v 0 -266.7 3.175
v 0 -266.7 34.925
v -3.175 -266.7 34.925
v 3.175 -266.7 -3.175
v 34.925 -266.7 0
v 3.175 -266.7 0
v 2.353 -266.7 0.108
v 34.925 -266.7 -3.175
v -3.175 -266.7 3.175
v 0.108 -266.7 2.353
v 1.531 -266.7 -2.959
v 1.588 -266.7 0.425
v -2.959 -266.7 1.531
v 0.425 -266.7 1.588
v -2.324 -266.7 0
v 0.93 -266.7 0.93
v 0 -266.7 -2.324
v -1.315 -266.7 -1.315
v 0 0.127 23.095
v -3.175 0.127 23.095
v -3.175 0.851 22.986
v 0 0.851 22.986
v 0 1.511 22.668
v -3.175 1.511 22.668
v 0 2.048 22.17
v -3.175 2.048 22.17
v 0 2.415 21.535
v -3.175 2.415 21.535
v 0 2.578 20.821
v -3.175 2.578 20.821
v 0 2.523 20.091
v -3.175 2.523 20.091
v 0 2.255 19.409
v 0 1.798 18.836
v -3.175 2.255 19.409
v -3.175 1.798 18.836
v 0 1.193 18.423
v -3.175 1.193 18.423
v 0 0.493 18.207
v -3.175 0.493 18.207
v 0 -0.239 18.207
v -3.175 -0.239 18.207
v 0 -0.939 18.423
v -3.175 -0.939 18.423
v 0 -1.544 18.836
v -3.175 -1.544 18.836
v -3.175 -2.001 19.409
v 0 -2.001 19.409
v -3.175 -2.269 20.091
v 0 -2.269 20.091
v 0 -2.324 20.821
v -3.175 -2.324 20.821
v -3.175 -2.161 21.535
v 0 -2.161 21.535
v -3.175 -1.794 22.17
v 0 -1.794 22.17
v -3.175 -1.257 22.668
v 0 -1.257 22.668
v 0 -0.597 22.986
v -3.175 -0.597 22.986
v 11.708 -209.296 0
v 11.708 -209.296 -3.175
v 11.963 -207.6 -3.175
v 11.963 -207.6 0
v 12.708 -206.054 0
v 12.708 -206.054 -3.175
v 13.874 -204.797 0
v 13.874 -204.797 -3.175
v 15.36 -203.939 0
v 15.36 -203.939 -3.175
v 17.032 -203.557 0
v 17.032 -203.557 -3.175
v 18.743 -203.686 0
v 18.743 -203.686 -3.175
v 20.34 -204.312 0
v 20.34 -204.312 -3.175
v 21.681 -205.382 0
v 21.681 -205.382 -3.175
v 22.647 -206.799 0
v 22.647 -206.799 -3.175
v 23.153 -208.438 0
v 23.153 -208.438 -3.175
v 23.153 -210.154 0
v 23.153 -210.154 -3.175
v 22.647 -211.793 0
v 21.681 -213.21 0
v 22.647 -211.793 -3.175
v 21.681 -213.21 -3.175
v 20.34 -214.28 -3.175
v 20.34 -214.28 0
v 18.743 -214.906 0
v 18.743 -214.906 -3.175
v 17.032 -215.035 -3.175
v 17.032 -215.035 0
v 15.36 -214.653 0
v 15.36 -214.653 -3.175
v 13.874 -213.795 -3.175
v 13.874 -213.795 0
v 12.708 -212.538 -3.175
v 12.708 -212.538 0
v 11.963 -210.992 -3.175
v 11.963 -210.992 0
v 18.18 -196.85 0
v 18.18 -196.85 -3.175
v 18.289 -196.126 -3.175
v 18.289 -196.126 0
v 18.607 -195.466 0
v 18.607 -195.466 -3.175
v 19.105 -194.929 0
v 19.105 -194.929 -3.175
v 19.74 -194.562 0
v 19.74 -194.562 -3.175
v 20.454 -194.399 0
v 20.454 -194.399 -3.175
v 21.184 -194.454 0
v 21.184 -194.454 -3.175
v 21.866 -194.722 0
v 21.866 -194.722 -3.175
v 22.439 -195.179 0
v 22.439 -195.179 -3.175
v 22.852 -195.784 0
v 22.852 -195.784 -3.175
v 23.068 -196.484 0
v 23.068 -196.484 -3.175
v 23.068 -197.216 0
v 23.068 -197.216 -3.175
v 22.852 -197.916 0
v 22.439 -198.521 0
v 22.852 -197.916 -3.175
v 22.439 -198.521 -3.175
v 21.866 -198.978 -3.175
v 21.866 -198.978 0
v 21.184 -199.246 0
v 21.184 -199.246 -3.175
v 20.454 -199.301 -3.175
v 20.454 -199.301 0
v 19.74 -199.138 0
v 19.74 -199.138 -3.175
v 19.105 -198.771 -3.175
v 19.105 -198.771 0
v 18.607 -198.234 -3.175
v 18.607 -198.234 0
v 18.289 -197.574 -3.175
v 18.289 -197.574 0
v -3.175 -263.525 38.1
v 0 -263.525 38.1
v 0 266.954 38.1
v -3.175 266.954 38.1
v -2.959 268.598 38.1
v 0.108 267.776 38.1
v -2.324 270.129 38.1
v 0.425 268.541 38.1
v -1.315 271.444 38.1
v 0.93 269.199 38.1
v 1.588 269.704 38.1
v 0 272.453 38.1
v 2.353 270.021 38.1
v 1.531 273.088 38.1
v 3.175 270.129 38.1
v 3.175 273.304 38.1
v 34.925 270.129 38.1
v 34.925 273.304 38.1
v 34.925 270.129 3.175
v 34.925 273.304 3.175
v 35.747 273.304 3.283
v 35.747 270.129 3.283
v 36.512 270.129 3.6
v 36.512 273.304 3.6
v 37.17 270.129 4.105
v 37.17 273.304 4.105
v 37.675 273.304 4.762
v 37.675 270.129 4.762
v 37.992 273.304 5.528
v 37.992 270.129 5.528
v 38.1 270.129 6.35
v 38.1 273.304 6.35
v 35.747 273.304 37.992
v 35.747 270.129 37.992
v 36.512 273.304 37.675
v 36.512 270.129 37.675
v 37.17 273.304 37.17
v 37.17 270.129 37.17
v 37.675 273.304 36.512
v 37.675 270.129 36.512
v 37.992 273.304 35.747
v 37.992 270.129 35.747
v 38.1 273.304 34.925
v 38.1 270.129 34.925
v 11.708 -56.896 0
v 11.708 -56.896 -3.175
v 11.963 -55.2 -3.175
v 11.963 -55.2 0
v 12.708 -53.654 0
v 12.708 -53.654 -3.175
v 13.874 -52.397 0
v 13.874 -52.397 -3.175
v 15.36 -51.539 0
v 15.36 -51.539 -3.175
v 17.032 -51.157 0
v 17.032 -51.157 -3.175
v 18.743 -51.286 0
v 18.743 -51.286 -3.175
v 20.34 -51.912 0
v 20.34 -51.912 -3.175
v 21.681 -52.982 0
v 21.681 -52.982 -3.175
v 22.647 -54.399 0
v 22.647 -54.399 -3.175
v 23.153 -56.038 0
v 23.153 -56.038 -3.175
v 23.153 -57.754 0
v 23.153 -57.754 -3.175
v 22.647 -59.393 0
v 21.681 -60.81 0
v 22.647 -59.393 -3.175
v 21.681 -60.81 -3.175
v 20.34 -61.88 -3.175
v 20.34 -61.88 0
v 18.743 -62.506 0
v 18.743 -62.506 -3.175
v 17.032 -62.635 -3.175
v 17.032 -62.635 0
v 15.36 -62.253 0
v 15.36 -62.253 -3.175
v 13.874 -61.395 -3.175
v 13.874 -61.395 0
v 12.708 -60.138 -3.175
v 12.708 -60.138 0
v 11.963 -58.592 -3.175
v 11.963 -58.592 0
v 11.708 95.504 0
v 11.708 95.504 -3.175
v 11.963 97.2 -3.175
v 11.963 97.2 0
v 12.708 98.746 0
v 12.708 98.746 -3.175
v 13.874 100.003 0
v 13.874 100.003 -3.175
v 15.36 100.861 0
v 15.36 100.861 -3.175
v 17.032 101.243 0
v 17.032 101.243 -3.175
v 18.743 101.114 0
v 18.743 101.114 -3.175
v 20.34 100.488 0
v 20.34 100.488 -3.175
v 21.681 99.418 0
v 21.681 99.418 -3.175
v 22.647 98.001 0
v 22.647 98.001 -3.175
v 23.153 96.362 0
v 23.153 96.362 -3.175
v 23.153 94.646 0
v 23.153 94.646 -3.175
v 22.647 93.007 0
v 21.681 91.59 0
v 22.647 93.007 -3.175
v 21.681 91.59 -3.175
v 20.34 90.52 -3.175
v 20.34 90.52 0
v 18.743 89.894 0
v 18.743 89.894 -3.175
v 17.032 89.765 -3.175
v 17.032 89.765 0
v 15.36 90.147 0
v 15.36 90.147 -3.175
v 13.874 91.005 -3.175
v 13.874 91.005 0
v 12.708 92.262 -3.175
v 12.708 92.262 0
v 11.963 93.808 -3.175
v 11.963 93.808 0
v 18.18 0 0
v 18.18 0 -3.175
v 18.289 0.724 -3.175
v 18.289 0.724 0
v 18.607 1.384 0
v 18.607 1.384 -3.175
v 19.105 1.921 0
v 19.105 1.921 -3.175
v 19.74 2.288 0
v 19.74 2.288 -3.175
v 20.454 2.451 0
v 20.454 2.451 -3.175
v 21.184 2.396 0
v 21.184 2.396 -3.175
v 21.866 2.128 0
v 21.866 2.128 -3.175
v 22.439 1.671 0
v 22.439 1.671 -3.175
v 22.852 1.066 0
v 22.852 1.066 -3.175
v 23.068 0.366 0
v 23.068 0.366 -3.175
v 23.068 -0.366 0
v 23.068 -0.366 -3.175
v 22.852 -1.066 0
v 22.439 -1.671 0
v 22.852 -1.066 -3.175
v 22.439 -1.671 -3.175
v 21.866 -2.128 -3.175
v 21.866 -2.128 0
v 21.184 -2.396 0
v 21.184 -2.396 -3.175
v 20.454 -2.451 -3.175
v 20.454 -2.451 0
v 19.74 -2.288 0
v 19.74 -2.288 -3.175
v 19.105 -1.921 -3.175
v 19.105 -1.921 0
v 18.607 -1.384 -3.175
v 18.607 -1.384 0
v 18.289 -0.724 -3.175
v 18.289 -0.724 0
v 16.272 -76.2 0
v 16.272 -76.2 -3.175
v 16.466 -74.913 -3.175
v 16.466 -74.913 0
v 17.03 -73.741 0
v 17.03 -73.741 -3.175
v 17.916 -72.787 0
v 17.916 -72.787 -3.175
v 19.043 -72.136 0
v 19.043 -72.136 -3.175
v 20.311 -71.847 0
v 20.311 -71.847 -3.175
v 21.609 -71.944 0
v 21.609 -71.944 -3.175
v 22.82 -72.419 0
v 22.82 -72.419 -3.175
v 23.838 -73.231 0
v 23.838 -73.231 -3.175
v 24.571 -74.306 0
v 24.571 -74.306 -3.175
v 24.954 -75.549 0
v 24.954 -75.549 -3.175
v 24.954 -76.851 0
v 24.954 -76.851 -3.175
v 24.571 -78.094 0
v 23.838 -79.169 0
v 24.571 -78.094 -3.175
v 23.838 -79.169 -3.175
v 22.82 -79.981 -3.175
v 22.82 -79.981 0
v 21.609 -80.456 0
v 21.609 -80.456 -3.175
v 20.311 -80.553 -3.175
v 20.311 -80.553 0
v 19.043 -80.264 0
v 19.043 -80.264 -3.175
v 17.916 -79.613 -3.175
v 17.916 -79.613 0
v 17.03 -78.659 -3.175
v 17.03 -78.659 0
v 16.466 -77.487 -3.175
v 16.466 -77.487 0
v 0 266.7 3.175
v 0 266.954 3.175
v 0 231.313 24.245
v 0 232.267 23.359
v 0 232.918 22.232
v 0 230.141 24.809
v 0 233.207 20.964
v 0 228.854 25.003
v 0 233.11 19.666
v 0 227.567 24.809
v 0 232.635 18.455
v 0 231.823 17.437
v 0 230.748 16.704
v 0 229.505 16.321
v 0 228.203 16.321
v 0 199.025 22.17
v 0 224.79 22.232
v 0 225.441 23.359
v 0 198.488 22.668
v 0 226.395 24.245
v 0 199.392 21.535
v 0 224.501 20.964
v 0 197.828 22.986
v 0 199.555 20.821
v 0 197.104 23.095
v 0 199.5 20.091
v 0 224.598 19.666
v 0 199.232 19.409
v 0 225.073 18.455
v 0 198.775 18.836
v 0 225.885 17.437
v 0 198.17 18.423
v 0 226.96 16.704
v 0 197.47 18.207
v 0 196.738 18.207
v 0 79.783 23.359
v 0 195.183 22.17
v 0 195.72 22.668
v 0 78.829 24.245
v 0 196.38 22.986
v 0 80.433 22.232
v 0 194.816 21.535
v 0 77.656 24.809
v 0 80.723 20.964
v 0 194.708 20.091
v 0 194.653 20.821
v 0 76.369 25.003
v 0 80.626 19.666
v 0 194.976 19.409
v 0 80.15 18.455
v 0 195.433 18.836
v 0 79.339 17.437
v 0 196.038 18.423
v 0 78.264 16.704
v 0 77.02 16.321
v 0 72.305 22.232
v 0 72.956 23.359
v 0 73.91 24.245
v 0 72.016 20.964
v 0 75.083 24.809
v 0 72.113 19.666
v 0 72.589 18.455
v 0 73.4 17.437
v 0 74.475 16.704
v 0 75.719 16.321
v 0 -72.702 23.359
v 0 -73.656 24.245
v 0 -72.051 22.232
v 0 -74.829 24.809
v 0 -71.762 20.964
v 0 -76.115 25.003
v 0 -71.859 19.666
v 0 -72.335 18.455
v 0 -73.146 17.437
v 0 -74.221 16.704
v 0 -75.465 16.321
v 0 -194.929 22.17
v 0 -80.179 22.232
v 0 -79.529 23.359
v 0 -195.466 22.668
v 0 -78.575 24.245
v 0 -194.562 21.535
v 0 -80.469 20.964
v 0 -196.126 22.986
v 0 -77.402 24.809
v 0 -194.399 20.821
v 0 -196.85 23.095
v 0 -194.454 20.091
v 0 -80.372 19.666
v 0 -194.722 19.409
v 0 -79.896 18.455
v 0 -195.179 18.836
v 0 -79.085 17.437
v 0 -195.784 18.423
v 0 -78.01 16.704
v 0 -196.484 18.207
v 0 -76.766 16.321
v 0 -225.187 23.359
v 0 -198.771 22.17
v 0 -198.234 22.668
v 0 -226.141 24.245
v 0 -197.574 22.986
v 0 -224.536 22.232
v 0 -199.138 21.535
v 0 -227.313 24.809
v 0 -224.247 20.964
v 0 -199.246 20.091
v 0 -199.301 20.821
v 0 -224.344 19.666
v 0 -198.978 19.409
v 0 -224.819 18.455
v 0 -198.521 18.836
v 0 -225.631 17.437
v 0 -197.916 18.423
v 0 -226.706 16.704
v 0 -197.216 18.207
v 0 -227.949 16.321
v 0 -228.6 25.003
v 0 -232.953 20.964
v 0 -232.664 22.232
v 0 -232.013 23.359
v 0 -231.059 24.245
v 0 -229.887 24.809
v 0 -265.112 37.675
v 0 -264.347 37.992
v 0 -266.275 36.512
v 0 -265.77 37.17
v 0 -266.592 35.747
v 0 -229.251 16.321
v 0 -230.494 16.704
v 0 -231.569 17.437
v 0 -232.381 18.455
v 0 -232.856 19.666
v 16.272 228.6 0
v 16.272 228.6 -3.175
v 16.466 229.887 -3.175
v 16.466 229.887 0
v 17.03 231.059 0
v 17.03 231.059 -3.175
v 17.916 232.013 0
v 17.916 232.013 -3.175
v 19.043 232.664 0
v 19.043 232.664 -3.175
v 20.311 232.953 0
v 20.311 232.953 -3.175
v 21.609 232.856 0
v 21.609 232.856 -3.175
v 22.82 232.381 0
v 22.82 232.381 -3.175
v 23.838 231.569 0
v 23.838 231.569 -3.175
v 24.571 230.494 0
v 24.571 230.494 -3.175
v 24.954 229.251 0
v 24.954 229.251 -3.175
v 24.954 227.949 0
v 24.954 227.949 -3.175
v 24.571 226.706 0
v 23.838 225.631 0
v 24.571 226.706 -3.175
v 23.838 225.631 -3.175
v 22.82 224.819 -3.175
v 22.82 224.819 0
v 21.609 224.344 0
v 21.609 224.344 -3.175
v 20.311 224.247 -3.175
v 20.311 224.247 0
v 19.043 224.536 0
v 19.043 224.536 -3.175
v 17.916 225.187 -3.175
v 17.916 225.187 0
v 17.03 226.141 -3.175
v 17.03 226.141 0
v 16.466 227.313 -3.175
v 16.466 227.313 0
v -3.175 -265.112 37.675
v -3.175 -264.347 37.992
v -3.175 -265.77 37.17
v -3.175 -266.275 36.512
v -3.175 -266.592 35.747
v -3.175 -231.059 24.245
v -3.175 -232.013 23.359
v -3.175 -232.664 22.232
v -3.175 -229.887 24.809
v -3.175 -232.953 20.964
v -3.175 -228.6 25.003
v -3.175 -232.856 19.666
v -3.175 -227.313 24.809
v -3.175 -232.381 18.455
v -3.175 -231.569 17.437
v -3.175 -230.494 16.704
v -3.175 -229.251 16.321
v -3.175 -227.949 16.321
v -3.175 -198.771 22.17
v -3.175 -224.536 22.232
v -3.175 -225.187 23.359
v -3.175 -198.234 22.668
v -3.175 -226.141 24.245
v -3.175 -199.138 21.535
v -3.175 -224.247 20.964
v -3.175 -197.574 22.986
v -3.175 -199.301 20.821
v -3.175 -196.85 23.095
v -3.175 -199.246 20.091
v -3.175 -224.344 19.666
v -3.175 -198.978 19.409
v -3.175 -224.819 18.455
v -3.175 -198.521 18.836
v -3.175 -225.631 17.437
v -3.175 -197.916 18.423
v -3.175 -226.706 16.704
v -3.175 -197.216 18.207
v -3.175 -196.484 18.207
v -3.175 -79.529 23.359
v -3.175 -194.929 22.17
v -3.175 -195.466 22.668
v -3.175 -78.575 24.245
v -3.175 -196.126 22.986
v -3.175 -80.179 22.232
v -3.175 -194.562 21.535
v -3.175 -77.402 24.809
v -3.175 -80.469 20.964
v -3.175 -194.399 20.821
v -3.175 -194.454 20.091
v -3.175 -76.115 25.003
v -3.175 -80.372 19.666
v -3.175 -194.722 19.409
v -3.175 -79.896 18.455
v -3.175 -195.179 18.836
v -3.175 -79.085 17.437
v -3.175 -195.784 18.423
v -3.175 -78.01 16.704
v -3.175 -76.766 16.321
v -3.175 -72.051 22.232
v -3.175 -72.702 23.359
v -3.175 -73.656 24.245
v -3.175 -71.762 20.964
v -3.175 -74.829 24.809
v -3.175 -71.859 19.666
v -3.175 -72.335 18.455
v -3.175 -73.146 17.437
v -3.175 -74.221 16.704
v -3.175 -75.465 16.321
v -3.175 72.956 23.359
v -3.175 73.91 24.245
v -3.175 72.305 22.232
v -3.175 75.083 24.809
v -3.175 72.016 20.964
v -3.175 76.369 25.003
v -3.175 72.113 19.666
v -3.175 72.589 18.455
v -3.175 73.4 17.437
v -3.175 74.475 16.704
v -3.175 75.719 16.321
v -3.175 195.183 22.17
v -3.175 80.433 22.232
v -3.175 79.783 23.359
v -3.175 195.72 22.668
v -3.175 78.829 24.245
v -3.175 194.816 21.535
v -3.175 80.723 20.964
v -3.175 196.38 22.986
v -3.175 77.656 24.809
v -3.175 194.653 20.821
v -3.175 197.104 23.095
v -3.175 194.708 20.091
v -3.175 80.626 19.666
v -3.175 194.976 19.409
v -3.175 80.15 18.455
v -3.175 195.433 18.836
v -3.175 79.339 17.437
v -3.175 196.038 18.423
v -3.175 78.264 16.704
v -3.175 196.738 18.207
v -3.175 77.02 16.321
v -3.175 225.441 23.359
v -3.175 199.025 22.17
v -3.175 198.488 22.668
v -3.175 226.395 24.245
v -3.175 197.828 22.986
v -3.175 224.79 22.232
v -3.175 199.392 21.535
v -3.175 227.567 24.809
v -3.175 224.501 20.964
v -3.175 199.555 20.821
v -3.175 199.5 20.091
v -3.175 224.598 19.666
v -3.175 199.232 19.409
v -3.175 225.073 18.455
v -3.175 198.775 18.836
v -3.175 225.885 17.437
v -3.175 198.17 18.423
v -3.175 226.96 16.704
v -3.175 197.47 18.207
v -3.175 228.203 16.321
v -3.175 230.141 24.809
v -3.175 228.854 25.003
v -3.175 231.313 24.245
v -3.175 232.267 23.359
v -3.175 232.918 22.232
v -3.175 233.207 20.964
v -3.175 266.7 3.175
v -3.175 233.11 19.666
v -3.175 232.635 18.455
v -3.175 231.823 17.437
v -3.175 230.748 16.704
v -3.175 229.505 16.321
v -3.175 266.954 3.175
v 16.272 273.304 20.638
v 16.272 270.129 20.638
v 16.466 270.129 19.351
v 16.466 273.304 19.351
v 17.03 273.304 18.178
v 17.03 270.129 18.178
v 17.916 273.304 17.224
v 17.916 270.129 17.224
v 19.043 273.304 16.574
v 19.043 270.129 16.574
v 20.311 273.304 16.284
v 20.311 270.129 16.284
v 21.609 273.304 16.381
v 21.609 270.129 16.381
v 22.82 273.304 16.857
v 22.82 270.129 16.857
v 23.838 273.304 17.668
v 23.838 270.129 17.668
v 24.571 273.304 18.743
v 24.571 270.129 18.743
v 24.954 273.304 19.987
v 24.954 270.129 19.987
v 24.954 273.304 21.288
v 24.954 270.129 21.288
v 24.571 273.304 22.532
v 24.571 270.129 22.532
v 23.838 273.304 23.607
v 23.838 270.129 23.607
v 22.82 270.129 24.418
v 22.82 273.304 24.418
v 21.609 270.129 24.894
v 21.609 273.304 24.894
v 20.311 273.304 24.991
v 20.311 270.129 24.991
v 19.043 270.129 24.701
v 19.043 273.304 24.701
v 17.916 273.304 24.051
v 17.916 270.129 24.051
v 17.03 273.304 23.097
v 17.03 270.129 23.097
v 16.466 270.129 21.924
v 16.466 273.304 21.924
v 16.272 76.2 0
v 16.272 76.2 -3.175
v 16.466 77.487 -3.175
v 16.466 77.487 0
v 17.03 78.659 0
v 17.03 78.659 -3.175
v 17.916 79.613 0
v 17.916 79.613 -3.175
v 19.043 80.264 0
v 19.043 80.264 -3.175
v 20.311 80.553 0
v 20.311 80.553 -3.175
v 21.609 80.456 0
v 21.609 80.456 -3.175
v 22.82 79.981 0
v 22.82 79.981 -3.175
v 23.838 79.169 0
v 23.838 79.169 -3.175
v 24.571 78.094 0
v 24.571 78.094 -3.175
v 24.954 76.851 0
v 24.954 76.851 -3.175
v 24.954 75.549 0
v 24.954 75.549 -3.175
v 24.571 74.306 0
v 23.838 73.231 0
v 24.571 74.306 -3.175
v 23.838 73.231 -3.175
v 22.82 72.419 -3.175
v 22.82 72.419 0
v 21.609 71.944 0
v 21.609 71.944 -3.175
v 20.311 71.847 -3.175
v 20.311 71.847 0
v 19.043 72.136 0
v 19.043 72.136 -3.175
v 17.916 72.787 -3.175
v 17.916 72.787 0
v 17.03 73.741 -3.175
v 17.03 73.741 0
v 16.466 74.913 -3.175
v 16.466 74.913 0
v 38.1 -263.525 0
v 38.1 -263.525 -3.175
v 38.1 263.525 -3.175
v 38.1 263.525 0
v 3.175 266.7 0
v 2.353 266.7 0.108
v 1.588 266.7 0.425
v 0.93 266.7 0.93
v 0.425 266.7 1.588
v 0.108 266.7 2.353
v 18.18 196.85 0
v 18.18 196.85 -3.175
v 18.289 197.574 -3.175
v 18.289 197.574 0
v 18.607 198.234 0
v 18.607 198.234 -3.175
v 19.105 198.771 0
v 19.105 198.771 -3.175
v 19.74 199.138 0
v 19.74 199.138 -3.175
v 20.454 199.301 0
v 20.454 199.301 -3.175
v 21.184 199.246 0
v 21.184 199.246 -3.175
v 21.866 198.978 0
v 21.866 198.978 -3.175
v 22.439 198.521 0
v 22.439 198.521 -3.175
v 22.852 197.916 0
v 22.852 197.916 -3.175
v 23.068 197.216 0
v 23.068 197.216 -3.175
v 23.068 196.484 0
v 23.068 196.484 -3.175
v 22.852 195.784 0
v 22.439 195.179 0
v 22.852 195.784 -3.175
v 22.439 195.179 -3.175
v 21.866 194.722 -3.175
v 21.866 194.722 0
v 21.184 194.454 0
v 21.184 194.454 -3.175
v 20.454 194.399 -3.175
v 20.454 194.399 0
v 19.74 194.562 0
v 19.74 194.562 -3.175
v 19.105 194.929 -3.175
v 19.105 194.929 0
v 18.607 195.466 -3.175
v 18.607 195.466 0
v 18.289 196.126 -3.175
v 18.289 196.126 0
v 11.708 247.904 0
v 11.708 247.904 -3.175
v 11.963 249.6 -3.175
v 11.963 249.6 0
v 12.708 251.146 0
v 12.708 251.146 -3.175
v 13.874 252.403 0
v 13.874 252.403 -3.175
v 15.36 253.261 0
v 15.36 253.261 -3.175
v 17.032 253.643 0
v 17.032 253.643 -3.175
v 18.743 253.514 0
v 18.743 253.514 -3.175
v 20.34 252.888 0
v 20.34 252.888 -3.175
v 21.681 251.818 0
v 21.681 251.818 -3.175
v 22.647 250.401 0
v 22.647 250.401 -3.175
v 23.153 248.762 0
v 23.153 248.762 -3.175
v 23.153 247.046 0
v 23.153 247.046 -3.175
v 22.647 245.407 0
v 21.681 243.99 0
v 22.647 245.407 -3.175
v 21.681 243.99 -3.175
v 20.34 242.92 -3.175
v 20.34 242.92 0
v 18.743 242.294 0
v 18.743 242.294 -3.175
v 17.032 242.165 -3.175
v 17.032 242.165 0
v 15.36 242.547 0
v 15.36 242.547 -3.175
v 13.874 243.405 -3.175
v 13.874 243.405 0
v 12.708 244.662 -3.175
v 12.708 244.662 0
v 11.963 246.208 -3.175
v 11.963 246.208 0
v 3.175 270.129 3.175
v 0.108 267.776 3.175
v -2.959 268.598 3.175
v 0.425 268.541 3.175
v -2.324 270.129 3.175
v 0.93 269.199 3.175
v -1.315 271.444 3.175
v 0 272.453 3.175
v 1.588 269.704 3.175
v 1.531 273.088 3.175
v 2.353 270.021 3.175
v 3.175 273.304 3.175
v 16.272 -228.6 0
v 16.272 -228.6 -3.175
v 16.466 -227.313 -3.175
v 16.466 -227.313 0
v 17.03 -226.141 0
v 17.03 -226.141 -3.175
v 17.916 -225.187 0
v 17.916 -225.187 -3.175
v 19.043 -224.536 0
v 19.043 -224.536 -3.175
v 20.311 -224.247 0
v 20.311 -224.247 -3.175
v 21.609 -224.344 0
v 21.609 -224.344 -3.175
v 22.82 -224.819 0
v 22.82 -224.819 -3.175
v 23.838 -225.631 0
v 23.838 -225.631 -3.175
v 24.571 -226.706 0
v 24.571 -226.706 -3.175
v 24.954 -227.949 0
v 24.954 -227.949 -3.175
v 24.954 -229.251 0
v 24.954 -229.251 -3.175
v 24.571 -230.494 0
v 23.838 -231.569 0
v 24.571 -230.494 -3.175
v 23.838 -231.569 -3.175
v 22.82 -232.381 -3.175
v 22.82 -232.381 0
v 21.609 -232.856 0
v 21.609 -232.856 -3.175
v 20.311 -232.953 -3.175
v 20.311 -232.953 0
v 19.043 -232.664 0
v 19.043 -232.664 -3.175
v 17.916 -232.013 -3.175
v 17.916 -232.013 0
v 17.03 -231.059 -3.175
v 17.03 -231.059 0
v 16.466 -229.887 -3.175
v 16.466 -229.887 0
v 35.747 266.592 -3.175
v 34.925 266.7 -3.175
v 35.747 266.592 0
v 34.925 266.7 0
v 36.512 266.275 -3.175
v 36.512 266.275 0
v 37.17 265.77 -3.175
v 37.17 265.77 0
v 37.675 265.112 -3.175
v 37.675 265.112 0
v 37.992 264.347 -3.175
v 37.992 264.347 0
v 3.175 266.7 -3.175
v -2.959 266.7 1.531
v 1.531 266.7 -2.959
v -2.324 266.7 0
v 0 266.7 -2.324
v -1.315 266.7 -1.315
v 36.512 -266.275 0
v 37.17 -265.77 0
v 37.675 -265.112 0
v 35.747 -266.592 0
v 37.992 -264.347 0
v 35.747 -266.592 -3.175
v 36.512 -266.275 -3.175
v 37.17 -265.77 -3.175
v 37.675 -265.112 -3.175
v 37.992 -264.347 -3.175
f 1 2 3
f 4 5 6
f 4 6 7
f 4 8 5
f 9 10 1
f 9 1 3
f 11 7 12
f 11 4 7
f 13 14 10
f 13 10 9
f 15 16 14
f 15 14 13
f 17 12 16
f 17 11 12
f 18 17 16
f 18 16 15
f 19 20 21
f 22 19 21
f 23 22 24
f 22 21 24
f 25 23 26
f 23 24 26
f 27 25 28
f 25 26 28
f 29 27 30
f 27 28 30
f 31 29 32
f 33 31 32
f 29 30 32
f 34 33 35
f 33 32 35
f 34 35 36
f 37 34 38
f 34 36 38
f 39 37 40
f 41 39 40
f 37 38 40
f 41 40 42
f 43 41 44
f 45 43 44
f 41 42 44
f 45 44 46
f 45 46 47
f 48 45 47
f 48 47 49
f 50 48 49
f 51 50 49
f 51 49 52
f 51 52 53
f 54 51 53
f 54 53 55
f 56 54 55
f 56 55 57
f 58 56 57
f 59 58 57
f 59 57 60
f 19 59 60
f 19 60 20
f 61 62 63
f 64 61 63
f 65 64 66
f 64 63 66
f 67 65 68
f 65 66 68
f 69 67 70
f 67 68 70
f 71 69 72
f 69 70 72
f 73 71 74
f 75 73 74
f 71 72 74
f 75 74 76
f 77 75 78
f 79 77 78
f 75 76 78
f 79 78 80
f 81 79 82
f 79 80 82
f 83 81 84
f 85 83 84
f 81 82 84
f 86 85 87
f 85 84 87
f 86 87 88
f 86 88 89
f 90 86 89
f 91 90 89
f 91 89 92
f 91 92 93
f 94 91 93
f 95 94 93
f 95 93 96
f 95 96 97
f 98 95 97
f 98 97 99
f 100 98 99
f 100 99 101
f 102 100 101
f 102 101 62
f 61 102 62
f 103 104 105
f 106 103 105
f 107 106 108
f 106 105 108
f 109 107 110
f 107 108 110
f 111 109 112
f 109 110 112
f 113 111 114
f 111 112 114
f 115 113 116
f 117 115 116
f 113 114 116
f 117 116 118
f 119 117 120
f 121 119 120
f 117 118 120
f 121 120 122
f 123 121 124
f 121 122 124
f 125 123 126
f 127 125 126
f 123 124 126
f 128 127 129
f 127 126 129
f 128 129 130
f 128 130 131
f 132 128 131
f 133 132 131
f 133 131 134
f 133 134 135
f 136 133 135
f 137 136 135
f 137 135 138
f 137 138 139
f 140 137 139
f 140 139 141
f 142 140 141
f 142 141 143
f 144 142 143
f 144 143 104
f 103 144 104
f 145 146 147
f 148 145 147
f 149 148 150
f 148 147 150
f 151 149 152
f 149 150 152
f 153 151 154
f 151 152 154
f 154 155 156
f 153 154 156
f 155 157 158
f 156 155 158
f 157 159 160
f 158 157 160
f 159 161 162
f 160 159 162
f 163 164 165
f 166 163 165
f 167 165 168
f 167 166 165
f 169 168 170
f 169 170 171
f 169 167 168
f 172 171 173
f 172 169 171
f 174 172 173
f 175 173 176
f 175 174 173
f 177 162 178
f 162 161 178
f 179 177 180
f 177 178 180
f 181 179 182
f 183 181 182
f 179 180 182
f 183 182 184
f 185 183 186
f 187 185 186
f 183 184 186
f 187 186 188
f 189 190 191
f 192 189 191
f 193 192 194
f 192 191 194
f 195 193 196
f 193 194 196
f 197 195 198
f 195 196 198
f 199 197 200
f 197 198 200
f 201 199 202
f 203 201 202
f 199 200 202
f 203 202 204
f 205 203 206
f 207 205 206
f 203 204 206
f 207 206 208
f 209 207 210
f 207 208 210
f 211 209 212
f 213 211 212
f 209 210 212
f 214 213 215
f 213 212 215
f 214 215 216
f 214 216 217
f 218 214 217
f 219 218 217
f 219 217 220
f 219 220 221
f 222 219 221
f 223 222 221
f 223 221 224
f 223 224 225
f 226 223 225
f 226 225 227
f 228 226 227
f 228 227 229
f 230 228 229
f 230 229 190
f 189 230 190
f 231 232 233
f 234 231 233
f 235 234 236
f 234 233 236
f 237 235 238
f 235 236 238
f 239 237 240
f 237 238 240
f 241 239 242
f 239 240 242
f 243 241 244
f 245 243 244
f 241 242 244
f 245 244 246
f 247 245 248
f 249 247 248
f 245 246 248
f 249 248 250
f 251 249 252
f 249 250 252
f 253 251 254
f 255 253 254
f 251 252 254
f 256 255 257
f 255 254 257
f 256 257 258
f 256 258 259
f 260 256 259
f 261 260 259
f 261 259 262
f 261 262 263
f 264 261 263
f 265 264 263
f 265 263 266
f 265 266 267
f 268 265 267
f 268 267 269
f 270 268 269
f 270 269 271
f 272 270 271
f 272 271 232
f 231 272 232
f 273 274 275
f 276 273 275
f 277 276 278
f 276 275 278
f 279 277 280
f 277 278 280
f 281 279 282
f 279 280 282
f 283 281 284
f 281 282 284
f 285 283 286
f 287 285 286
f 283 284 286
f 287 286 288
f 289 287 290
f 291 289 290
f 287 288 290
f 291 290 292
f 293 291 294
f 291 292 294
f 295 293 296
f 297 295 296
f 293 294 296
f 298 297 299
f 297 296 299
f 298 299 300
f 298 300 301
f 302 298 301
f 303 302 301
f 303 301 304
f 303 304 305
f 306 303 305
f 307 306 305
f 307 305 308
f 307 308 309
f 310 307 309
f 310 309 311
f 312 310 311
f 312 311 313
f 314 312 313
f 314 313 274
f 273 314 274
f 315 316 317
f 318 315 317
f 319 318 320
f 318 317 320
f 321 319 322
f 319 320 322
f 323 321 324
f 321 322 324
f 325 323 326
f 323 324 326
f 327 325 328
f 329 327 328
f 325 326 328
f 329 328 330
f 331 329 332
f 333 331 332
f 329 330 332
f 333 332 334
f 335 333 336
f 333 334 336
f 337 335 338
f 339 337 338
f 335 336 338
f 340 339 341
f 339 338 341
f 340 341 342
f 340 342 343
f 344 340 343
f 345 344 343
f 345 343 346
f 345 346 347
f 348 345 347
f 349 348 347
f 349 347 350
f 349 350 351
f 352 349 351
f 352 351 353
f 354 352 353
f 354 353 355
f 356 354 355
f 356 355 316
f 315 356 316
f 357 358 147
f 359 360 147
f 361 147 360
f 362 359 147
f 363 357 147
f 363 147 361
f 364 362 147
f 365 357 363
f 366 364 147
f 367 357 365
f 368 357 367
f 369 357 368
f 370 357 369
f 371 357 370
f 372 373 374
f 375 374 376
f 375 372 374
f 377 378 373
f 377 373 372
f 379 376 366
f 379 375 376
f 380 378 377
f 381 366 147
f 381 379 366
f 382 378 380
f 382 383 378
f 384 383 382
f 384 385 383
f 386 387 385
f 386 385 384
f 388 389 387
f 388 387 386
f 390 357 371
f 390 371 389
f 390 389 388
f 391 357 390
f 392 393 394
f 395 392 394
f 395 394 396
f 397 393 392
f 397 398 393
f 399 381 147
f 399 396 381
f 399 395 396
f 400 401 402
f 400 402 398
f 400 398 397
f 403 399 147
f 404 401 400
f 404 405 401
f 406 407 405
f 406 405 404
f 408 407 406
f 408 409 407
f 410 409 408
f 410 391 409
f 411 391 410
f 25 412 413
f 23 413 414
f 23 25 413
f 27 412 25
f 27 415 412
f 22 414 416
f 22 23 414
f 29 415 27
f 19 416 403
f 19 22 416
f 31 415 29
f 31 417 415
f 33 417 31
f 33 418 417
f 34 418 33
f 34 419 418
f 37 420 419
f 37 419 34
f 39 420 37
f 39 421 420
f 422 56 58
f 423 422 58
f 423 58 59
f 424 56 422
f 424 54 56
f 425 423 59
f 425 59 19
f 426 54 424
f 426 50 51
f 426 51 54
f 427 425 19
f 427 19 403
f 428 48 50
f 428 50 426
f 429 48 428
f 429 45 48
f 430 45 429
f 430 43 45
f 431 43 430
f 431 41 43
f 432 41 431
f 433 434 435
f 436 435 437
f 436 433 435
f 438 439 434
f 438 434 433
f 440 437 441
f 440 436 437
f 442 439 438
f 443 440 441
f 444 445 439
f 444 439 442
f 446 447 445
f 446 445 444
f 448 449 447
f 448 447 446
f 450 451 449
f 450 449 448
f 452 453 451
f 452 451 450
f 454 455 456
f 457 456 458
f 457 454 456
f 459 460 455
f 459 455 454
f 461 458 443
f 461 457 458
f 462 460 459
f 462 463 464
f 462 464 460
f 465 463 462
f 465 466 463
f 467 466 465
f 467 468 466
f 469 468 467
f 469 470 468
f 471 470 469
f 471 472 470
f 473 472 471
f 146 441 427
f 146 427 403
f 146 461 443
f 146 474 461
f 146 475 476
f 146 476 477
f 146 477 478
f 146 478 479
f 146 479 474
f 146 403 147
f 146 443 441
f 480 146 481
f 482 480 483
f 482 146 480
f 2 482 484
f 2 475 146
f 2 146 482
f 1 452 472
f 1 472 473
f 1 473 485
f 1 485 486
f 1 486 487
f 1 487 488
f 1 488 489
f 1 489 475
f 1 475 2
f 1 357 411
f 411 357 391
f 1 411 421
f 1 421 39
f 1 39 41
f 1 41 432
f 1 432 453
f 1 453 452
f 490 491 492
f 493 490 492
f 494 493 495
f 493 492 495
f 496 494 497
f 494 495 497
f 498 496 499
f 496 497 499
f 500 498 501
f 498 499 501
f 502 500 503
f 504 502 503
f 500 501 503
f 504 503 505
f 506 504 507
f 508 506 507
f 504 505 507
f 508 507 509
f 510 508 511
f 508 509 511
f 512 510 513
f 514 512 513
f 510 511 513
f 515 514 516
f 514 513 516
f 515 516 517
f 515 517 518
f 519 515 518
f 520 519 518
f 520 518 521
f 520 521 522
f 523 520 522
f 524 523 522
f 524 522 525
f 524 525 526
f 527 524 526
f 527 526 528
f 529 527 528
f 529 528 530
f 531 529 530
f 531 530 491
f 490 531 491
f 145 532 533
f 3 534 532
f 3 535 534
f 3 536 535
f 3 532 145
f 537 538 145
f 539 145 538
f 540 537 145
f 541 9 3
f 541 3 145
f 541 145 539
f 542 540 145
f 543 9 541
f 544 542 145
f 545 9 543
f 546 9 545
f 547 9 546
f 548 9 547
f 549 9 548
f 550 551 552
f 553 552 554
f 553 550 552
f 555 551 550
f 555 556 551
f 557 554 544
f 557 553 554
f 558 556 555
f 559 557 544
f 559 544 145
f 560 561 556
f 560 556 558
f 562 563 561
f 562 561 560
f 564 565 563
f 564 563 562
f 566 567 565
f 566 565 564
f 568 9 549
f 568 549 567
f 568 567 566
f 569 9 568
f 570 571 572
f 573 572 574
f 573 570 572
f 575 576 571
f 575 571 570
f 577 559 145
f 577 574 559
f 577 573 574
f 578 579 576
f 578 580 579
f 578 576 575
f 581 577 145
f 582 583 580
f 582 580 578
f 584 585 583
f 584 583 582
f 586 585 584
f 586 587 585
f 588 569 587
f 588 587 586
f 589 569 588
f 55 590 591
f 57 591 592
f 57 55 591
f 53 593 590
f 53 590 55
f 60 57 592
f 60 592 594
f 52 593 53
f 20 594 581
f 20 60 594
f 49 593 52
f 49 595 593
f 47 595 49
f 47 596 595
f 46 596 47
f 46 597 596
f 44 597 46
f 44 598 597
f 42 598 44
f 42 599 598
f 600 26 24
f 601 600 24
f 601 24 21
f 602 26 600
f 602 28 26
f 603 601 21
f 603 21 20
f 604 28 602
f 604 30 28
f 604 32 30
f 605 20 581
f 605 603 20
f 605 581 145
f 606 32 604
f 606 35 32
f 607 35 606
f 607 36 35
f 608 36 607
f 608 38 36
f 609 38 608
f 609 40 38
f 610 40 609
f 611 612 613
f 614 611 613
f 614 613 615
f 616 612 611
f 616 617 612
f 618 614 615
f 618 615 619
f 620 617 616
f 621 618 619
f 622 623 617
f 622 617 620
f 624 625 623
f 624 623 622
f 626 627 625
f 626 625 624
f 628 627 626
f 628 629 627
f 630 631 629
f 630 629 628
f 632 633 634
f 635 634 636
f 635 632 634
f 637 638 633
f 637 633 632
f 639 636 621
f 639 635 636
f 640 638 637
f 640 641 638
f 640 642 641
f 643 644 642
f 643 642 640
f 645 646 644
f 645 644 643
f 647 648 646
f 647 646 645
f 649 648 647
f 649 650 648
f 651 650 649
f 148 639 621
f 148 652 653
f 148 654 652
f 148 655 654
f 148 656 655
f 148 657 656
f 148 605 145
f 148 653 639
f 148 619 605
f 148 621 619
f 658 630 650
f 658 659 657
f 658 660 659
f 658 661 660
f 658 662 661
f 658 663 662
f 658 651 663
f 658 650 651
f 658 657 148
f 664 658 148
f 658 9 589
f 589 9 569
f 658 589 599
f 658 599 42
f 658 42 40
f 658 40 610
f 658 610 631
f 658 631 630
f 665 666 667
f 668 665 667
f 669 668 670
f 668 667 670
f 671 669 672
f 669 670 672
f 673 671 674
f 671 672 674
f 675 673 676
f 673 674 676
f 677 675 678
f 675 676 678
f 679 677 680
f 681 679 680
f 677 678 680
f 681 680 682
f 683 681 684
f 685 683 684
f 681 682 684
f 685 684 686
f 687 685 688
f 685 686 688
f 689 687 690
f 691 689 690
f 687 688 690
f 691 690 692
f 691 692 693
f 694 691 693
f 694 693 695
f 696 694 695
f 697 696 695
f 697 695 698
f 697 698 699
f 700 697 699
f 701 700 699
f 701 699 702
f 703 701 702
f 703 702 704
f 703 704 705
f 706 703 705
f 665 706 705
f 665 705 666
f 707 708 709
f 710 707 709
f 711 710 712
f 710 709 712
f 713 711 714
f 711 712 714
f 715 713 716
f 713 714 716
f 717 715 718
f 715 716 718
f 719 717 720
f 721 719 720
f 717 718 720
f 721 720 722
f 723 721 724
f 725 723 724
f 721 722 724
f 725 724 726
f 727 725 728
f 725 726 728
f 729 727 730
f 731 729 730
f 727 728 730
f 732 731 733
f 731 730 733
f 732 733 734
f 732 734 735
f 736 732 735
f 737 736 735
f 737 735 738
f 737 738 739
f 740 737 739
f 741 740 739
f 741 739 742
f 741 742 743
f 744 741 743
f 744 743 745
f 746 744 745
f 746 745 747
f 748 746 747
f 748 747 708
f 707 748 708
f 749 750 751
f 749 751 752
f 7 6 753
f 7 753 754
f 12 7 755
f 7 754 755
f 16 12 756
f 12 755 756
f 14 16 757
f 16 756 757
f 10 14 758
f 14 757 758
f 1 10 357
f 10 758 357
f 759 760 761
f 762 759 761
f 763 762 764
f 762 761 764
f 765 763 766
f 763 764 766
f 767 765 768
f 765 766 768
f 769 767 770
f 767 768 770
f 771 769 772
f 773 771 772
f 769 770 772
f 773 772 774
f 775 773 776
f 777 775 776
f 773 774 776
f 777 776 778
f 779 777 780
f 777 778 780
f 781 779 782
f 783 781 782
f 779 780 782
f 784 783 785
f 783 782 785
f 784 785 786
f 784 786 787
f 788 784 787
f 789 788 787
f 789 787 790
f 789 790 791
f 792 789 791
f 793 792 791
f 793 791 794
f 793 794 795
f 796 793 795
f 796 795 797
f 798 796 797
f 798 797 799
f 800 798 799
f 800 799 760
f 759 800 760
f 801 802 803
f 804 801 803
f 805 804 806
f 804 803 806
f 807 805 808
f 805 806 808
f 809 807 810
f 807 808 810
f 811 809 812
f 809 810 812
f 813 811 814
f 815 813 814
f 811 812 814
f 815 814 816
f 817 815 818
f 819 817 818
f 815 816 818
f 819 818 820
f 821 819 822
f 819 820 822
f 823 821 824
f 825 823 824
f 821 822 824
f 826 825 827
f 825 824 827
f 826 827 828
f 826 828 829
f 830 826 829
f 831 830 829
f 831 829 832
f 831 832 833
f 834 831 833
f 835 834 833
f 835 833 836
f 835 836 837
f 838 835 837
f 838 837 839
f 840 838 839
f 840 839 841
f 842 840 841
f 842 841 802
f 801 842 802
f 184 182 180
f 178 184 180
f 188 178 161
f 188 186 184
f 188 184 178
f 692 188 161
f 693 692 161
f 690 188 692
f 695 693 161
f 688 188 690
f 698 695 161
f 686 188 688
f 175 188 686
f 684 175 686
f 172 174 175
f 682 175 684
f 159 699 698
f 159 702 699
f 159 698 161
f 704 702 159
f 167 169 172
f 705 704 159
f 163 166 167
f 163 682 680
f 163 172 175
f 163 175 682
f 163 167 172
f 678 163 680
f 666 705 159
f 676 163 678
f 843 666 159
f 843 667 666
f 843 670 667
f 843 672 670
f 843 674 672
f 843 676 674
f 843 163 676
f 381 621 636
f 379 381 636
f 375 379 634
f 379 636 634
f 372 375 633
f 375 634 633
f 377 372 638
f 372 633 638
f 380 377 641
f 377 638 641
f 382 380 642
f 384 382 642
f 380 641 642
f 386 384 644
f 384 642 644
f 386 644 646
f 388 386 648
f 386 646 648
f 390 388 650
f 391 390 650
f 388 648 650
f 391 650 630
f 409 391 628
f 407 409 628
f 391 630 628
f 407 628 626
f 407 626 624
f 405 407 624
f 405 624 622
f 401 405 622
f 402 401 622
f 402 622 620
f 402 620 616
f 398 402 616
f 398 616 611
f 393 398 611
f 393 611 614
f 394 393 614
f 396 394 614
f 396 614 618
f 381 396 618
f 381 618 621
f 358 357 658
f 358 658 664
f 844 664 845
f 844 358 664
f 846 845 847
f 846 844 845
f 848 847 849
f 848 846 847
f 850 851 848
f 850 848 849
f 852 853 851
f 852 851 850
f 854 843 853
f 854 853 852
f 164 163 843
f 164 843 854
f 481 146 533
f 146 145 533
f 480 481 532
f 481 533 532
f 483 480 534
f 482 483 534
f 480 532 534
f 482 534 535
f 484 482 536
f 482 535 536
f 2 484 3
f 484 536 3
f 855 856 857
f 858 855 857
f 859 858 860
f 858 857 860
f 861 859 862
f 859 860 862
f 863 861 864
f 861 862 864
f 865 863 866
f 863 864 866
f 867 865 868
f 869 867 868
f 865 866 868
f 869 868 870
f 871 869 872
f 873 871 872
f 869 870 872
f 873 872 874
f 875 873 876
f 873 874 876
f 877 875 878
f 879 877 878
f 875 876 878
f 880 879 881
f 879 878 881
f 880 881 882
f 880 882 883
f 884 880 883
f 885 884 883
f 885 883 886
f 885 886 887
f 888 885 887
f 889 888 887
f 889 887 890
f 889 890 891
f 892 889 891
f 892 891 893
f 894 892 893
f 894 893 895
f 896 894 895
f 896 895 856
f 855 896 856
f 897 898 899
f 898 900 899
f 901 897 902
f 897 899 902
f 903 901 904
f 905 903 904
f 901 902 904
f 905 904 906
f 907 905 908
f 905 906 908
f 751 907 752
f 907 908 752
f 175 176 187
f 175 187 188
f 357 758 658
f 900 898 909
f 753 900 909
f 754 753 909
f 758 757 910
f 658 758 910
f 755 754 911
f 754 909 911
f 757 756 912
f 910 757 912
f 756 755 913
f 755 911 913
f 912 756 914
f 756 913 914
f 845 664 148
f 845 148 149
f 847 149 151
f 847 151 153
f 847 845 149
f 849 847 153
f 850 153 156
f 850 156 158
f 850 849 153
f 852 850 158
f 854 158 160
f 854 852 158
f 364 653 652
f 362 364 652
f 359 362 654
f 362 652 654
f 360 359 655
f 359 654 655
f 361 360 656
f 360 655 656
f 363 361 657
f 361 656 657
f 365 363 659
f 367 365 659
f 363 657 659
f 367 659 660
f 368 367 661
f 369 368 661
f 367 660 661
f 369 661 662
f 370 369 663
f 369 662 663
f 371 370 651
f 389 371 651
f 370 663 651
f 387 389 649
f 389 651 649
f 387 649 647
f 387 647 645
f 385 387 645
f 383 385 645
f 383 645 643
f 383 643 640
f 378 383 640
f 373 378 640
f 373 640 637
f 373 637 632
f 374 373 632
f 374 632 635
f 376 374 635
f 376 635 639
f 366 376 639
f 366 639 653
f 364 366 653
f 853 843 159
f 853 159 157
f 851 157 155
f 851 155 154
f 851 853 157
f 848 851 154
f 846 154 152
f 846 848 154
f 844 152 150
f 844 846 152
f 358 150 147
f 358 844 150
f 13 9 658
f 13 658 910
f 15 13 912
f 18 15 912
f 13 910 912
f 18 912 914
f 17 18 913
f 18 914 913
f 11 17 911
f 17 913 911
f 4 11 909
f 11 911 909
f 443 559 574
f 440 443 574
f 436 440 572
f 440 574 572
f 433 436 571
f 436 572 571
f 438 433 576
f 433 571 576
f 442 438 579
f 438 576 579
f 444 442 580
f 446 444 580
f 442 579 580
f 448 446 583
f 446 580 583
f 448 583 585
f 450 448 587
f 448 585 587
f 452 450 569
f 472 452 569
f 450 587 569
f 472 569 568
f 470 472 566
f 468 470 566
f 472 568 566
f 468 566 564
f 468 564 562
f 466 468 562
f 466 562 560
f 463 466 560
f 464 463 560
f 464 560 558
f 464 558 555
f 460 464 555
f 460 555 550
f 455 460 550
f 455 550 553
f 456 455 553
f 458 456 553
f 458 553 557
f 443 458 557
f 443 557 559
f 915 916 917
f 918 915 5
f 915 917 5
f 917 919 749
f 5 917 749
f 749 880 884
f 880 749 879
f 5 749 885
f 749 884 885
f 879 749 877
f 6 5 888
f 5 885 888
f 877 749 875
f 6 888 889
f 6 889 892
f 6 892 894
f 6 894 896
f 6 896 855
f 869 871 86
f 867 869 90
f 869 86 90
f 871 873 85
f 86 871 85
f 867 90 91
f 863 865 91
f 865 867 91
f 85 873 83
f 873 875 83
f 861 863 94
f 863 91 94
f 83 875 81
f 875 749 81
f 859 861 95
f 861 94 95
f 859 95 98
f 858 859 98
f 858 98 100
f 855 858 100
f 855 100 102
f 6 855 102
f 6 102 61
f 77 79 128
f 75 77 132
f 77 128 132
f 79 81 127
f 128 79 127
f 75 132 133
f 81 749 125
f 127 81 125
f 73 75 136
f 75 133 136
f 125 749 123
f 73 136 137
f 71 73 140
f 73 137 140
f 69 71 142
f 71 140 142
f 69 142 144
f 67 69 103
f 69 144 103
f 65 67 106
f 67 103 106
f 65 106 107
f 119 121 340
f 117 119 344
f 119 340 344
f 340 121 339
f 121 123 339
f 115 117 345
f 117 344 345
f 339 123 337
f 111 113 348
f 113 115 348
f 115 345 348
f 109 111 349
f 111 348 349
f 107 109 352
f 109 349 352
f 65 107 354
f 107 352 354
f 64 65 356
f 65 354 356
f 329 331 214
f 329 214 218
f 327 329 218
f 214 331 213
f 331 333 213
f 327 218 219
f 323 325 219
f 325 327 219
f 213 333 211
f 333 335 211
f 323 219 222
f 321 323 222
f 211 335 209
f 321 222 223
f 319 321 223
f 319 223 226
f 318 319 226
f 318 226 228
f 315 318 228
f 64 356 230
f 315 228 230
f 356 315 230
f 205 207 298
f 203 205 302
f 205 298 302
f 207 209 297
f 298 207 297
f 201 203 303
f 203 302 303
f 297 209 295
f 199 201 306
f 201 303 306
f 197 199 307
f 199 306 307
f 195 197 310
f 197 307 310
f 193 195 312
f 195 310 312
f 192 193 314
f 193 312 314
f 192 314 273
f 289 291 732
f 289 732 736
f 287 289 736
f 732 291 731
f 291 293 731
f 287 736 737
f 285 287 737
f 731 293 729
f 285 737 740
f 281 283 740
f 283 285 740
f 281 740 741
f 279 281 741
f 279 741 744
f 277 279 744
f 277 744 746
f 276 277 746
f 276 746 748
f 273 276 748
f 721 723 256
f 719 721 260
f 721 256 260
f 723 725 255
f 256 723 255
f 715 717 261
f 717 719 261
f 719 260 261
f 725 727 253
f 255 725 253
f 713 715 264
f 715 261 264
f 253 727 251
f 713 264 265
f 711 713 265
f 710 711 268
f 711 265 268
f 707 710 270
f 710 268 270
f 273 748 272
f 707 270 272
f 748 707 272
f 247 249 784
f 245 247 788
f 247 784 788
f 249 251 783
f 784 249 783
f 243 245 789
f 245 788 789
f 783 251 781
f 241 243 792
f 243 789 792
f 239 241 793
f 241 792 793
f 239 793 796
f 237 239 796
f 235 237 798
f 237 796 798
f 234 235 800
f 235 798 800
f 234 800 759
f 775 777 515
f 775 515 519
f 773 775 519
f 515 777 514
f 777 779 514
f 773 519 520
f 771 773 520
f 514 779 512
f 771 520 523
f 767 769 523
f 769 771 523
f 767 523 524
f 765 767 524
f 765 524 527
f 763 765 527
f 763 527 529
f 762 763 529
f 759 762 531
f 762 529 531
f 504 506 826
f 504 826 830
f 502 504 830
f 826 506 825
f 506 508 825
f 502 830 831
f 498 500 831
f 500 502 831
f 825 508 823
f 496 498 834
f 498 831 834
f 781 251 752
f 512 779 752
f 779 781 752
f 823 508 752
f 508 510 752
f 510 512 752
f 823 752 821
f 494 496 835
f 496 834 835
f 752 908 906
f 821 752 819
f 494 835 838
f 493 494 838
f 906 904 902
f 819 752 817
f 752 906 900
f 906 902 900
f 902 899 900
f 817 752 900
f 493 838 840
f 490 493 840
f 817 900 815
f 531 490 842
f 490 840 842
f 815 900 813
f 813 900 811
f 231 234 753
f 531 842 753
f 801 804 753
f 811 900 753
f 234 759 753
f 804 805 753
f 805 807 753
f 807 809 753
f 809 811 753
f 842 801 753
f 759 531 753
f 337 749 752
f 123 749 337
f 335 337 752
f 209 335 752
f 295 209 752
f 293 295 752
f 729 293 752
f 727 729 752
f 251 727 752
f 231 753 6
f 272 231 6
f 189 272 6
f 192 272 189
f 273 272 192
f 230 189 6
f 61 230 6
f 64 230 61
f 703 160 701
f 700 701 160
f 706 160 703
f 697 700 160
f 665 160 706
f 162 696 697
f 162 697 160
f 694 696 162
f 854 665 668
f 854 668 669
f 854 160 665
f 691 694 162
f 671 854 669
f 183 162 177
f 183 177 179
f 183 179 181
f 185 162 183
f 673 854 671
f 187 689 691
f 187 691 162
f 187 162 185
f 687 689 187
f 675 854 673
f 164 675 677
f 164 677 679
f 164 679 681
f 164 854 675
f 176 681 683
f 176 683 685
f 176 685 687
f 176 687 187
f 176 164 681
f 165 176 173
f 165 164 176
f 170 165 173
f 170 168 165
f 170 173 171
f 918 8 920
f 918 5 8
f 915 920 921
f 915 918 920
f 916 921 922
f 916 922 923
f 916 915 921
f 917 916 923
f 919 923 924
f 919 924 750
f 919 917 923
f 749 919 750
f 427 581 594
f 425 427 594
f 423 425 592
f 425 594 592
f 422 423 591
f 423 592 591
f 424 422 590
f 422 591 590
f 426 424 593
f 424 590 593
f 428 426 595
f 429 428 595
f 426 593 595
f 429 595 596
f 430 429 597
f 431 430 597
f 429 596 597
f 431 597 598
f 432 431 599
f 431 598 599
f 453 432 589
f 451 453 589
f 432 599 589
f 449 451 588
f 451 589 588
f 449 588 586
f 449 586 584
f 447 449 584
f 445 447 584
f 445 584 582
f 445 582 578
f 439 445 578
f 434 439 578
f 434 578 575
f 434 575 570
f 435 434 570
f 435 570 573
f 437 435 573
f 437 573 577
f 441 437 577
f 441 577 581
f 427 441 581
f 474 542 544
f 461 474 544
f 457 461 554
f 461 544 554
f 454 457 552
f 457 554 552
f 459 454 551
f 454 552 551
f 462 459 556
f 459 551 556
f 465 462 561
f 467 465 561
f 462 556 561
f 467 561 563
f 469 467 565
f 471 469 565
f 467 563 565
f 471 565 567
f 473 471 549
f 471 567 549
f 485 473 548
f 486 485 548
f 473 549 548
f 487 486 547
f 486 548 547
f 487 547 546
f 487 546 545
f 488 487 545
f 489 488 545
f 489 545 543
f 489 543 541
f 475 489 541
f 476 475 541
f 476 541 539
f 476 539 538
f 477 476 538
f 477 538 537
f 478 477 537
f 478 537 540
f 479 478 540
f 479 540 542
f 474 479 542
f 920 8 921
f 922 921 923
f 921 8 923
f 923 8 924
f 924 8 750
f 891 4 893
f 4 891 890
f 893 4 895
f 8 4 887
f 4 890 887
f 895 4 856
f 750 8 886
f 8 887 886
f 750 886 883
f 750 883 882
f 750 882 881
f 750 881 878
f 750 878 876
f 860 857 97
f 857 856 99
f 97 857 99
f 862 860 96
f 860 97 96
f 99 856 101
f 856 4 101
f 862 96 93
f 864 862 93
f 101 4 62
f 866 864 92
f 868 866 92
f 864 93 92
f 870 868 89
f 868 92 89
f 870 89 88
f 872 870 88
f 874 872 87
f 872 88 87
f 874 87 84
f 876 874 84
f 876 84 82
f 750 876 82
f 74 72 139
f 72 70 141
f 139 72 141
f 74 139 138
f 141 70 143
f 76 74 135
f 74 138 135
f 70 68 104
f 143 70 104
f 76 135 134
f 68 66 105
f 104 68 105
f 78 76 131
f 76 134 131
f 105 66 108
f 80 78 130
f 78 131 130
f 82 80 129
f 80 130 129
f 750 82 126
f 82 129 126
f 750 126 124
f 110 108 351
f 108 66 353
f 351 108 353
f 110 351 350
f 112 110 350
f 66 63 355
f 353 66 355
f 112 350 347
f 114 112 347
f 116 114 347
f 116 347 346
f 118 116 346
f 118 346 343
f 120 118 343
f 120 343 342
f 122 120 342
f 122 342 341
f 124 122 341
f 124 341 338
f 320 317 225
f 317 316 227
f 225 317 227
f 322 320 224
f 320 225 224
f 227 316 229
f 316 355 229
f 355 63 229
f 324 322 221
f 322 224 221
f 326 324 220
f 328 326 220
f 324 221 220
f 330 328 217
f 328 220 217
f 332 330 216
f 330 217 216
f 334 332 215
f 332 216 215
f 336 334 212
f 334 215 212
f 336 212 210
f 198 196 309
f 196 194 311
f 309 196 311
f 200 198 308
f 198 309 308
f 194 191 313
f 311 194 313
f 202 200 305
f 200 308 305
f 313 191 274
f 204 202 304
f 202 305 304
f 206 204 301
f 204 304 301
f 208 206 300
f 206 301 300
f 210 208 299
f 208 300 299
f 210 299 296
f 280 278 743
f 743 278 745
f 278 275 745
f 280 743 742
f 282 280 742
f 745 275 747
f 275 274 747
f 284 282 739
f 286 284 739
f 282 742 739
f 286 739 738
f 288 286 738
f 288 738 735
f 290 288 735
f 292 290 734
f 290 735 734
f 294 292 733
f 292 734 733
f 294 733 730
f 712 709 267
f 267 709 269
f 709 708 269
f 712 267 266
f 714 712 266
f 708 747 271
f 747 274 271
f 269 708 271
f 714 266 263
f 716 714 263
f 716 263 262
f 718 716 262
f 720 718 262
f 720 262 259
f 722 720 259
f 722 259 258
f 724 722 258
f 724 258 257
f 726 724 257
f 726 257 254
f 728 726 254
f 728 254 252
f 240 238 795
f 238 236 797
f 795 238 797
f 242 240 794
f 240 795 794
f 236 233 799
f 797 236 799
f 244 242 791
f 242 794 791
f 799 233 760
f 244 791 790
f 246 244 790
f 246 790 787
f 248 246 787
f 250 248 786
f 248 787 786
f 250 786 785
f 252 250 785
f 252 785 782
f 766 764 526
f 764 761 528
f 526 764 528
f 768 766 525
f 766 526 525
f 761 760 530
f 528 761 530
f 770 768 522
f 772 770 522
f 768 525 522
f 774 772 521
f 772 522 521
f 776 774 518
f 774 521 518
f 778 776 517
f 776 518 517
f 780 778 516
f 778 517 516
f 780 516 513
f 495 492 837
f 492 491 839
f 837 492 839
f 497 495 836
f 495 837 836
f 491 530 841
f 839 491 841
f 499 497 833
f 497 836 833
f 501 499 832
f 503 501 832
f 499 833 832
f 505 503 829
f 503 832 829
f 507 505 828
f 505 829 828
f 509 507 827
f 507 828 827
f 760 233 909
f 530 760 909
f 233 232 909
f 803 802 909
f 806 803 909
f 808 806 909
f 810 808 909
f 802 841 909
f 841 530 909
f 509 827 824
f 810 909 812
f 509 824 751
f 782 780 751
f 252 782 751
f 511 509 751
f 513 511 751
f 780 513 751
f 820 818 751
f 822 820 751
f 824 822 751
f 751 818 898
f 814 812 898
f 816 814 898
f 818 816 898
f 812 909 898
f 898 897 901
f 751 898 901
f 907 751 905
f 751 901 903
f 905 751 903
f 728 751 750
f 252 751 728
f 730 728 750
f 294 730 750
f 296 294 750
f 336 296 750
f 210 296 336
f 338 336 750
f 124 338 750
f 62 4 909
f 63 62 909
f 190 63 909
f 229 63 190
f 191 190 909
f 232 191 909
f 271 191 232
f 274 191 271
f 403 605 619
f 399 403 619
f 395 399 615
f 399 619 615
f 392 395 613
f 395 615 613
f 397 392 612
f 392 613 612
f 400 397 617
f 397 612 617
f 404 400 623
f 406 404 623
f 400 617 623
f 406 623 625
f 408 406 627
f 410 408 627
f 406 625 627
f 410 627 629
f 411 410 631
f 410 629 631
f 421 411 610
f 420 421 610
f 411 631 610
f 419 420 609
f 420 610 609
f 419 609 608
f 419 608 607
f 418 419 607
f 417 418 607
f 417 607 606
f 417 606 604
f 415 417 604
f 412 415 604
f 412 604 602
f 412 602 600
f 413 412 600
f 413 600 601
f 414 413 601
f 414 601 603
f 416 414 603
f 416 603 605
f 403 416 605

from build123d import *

# Parameters (mm, degrees)
BASE_FLANGE1_DEPTH               = 266.7
F_10_0_1935_DIAMETER_HOLE1_D     = 4.9149
F_29_64_0_45313_DIAMETER_HOLE1_D = 11.509502
F_11_32_0_34375_DIAMETER_HOLE1_D = 8.73125
EDGE_FLANGE1_DEPTH               = 34.925
F_11_32_0_34375_DIAMETER_HOLE2_D = 8.73125
F_11_32_0_34375_DIAMETER_HOLE6_D = 8.73125
FILLET1_R                        = 3.175
F_10_0_1935_DIAMETER_HOLE2_D     = 4.9149


# Sheet-metal steps are written as plain solids
with BuildPart() as part:
    # Sketch1 → Base-Flange1 (new, symmetric)
    with BuildSketch(Plane(origin=(0, 0, 0), x_dir=(1, 0, 0), z_dir=(0, 1, 0))):
        with BuildLine():
            Line((38.1, 0), (3.175, 0))
            ThreePointArc((3.175, 0), (0.92993597, -0.92993597), (0, -3.175))
            Line((0, -3.175), (0, -38.1))
            Line((0, -38.1), (-3.175, -38.1))
            Line((-3.175, -38.1), (-3.175, -3.175))
            ThreePointArc((-3.175, -3.175), (-1.315128061, 1.315128061), (3.175, 3.175))
            Line((3.175, 3.175), (38.1, 3.175))
            Line((38.1, 3.175), (38.1, 0))
        make_face()
    extrude(amount=BASE_FLANGE1_DEPTH, both=True)

    # #10 (0.1935) Diameter Hole1 (through all)
    with Locations(Plane.XY):
        with Locations((20.6375, -196.85), (20.6375, 0), (20.6375, 196.85)):
            Hole(F_10_0_1935_DIAMETER_HOLE1_D / 2)

    # 29/64 (0.45313) Diameter Hole1 (through all)
    with Locations(Plane.XY):
        with Locations((17.4625, 247.904), (17.4625, 95.504), (17.4625, -56.896), (17.4625, -209.296)):
            Hole(F_29_64_0_45313_DIAMETER_HOLE1_D / 2)

    # 11/32 (0.34375) Diameter Hole1 (through all)
    with Locations(Plane.XY):
        with Locations((20.6375, 228.6), (20.6375, 76.2), (20.6375, -76.2), (20.6375, -228.6)):
            Hole(F_11_32_0_34375_DIAMETER_HOLE1_D / 2)

    # Edge-Flange1 section (across the edge) → Edge-Flange1 (add)
    with BuildSketch(Plane(origin=(0, 273.304, 3.175), x_dir=(0, -1, 0), z_dir=(0, 0, 1))):
        with BuildLine():
            Line((0, 3.175), (0, 38.1))
            Line((0, 38.1), (3.175, 38.1))
            Line((3.175, 38.1), (3.175, 3.175))
            ThreePointArc((3.175, 3.175), (4.10493597, 0.92993597), (6.35, 0))
            Line((6.35, 0), (6.604, 0))
            Line((6.604, 0), (6.604, -3.175))
            Line((6.604, -3.175), (6.35, -3.175))
            ThreePointArc((6.35, -3.175), (1.859871939, -1.315128061), (0, 3.175))
        make_face()
    extrude(amount=EDGE_FLANGE1_DEPTH)

    # 11/32 (0.34375) Diameter Hole2 (through all)
    with Locations(Plane(origin=(0, 0, 0), x_dir=(0, 0, -1), z_dir=(1, 0, 0))):
        with Locations((-20.6375, 228.854), (-20.6375, 76.369333333), (-20.6375, -76.115333333), (-20.6375, -228.6)):
            Hole(F_11_32_0_34375_DIAMETER_HOLE2_D / 2)

    # 11/32 (0.34375) Diameter Hole6 (through all)
    with Locations(Plane(origin=(0, 273.304, 0), x_dir=(1, 0, 0), z_dir=(0, 1, 0))):
        with Locations((20.6375, -20.6375)):
            Hole(F_11_32_0_34375_DIAMETER_HOLE6_D / 2)

    # Fillet1
    fillet1_edges = [part.edges().sort_by_distance(p)[0] for p in [
        (38.1, 271.7165, 3.175),
        (38.1, 271.7165, 38.1),
        (38.1, 266.7, -1.5875),
        (38.1, -266.7, -1.5875),
        (-1.5875, -266.7, 38.1),
    ]]
    fillet(fillet1_edges, radius=FILLET1_R)

    # #10 (0.1935) Diameter Hole2 (through all)
    with Locations(Plane(origin=(0, 0, 0), x_dir=(0, 0, -1), z_dir=(1, 0, 0))):
        with Locations((-20.6375, 197.104), (-20.6375, -196.85), (-20.6375, 0.127)):
            Hole(F_10_0_1935_DIAMETER_HOLE2_D / 2)


solid = part.part
